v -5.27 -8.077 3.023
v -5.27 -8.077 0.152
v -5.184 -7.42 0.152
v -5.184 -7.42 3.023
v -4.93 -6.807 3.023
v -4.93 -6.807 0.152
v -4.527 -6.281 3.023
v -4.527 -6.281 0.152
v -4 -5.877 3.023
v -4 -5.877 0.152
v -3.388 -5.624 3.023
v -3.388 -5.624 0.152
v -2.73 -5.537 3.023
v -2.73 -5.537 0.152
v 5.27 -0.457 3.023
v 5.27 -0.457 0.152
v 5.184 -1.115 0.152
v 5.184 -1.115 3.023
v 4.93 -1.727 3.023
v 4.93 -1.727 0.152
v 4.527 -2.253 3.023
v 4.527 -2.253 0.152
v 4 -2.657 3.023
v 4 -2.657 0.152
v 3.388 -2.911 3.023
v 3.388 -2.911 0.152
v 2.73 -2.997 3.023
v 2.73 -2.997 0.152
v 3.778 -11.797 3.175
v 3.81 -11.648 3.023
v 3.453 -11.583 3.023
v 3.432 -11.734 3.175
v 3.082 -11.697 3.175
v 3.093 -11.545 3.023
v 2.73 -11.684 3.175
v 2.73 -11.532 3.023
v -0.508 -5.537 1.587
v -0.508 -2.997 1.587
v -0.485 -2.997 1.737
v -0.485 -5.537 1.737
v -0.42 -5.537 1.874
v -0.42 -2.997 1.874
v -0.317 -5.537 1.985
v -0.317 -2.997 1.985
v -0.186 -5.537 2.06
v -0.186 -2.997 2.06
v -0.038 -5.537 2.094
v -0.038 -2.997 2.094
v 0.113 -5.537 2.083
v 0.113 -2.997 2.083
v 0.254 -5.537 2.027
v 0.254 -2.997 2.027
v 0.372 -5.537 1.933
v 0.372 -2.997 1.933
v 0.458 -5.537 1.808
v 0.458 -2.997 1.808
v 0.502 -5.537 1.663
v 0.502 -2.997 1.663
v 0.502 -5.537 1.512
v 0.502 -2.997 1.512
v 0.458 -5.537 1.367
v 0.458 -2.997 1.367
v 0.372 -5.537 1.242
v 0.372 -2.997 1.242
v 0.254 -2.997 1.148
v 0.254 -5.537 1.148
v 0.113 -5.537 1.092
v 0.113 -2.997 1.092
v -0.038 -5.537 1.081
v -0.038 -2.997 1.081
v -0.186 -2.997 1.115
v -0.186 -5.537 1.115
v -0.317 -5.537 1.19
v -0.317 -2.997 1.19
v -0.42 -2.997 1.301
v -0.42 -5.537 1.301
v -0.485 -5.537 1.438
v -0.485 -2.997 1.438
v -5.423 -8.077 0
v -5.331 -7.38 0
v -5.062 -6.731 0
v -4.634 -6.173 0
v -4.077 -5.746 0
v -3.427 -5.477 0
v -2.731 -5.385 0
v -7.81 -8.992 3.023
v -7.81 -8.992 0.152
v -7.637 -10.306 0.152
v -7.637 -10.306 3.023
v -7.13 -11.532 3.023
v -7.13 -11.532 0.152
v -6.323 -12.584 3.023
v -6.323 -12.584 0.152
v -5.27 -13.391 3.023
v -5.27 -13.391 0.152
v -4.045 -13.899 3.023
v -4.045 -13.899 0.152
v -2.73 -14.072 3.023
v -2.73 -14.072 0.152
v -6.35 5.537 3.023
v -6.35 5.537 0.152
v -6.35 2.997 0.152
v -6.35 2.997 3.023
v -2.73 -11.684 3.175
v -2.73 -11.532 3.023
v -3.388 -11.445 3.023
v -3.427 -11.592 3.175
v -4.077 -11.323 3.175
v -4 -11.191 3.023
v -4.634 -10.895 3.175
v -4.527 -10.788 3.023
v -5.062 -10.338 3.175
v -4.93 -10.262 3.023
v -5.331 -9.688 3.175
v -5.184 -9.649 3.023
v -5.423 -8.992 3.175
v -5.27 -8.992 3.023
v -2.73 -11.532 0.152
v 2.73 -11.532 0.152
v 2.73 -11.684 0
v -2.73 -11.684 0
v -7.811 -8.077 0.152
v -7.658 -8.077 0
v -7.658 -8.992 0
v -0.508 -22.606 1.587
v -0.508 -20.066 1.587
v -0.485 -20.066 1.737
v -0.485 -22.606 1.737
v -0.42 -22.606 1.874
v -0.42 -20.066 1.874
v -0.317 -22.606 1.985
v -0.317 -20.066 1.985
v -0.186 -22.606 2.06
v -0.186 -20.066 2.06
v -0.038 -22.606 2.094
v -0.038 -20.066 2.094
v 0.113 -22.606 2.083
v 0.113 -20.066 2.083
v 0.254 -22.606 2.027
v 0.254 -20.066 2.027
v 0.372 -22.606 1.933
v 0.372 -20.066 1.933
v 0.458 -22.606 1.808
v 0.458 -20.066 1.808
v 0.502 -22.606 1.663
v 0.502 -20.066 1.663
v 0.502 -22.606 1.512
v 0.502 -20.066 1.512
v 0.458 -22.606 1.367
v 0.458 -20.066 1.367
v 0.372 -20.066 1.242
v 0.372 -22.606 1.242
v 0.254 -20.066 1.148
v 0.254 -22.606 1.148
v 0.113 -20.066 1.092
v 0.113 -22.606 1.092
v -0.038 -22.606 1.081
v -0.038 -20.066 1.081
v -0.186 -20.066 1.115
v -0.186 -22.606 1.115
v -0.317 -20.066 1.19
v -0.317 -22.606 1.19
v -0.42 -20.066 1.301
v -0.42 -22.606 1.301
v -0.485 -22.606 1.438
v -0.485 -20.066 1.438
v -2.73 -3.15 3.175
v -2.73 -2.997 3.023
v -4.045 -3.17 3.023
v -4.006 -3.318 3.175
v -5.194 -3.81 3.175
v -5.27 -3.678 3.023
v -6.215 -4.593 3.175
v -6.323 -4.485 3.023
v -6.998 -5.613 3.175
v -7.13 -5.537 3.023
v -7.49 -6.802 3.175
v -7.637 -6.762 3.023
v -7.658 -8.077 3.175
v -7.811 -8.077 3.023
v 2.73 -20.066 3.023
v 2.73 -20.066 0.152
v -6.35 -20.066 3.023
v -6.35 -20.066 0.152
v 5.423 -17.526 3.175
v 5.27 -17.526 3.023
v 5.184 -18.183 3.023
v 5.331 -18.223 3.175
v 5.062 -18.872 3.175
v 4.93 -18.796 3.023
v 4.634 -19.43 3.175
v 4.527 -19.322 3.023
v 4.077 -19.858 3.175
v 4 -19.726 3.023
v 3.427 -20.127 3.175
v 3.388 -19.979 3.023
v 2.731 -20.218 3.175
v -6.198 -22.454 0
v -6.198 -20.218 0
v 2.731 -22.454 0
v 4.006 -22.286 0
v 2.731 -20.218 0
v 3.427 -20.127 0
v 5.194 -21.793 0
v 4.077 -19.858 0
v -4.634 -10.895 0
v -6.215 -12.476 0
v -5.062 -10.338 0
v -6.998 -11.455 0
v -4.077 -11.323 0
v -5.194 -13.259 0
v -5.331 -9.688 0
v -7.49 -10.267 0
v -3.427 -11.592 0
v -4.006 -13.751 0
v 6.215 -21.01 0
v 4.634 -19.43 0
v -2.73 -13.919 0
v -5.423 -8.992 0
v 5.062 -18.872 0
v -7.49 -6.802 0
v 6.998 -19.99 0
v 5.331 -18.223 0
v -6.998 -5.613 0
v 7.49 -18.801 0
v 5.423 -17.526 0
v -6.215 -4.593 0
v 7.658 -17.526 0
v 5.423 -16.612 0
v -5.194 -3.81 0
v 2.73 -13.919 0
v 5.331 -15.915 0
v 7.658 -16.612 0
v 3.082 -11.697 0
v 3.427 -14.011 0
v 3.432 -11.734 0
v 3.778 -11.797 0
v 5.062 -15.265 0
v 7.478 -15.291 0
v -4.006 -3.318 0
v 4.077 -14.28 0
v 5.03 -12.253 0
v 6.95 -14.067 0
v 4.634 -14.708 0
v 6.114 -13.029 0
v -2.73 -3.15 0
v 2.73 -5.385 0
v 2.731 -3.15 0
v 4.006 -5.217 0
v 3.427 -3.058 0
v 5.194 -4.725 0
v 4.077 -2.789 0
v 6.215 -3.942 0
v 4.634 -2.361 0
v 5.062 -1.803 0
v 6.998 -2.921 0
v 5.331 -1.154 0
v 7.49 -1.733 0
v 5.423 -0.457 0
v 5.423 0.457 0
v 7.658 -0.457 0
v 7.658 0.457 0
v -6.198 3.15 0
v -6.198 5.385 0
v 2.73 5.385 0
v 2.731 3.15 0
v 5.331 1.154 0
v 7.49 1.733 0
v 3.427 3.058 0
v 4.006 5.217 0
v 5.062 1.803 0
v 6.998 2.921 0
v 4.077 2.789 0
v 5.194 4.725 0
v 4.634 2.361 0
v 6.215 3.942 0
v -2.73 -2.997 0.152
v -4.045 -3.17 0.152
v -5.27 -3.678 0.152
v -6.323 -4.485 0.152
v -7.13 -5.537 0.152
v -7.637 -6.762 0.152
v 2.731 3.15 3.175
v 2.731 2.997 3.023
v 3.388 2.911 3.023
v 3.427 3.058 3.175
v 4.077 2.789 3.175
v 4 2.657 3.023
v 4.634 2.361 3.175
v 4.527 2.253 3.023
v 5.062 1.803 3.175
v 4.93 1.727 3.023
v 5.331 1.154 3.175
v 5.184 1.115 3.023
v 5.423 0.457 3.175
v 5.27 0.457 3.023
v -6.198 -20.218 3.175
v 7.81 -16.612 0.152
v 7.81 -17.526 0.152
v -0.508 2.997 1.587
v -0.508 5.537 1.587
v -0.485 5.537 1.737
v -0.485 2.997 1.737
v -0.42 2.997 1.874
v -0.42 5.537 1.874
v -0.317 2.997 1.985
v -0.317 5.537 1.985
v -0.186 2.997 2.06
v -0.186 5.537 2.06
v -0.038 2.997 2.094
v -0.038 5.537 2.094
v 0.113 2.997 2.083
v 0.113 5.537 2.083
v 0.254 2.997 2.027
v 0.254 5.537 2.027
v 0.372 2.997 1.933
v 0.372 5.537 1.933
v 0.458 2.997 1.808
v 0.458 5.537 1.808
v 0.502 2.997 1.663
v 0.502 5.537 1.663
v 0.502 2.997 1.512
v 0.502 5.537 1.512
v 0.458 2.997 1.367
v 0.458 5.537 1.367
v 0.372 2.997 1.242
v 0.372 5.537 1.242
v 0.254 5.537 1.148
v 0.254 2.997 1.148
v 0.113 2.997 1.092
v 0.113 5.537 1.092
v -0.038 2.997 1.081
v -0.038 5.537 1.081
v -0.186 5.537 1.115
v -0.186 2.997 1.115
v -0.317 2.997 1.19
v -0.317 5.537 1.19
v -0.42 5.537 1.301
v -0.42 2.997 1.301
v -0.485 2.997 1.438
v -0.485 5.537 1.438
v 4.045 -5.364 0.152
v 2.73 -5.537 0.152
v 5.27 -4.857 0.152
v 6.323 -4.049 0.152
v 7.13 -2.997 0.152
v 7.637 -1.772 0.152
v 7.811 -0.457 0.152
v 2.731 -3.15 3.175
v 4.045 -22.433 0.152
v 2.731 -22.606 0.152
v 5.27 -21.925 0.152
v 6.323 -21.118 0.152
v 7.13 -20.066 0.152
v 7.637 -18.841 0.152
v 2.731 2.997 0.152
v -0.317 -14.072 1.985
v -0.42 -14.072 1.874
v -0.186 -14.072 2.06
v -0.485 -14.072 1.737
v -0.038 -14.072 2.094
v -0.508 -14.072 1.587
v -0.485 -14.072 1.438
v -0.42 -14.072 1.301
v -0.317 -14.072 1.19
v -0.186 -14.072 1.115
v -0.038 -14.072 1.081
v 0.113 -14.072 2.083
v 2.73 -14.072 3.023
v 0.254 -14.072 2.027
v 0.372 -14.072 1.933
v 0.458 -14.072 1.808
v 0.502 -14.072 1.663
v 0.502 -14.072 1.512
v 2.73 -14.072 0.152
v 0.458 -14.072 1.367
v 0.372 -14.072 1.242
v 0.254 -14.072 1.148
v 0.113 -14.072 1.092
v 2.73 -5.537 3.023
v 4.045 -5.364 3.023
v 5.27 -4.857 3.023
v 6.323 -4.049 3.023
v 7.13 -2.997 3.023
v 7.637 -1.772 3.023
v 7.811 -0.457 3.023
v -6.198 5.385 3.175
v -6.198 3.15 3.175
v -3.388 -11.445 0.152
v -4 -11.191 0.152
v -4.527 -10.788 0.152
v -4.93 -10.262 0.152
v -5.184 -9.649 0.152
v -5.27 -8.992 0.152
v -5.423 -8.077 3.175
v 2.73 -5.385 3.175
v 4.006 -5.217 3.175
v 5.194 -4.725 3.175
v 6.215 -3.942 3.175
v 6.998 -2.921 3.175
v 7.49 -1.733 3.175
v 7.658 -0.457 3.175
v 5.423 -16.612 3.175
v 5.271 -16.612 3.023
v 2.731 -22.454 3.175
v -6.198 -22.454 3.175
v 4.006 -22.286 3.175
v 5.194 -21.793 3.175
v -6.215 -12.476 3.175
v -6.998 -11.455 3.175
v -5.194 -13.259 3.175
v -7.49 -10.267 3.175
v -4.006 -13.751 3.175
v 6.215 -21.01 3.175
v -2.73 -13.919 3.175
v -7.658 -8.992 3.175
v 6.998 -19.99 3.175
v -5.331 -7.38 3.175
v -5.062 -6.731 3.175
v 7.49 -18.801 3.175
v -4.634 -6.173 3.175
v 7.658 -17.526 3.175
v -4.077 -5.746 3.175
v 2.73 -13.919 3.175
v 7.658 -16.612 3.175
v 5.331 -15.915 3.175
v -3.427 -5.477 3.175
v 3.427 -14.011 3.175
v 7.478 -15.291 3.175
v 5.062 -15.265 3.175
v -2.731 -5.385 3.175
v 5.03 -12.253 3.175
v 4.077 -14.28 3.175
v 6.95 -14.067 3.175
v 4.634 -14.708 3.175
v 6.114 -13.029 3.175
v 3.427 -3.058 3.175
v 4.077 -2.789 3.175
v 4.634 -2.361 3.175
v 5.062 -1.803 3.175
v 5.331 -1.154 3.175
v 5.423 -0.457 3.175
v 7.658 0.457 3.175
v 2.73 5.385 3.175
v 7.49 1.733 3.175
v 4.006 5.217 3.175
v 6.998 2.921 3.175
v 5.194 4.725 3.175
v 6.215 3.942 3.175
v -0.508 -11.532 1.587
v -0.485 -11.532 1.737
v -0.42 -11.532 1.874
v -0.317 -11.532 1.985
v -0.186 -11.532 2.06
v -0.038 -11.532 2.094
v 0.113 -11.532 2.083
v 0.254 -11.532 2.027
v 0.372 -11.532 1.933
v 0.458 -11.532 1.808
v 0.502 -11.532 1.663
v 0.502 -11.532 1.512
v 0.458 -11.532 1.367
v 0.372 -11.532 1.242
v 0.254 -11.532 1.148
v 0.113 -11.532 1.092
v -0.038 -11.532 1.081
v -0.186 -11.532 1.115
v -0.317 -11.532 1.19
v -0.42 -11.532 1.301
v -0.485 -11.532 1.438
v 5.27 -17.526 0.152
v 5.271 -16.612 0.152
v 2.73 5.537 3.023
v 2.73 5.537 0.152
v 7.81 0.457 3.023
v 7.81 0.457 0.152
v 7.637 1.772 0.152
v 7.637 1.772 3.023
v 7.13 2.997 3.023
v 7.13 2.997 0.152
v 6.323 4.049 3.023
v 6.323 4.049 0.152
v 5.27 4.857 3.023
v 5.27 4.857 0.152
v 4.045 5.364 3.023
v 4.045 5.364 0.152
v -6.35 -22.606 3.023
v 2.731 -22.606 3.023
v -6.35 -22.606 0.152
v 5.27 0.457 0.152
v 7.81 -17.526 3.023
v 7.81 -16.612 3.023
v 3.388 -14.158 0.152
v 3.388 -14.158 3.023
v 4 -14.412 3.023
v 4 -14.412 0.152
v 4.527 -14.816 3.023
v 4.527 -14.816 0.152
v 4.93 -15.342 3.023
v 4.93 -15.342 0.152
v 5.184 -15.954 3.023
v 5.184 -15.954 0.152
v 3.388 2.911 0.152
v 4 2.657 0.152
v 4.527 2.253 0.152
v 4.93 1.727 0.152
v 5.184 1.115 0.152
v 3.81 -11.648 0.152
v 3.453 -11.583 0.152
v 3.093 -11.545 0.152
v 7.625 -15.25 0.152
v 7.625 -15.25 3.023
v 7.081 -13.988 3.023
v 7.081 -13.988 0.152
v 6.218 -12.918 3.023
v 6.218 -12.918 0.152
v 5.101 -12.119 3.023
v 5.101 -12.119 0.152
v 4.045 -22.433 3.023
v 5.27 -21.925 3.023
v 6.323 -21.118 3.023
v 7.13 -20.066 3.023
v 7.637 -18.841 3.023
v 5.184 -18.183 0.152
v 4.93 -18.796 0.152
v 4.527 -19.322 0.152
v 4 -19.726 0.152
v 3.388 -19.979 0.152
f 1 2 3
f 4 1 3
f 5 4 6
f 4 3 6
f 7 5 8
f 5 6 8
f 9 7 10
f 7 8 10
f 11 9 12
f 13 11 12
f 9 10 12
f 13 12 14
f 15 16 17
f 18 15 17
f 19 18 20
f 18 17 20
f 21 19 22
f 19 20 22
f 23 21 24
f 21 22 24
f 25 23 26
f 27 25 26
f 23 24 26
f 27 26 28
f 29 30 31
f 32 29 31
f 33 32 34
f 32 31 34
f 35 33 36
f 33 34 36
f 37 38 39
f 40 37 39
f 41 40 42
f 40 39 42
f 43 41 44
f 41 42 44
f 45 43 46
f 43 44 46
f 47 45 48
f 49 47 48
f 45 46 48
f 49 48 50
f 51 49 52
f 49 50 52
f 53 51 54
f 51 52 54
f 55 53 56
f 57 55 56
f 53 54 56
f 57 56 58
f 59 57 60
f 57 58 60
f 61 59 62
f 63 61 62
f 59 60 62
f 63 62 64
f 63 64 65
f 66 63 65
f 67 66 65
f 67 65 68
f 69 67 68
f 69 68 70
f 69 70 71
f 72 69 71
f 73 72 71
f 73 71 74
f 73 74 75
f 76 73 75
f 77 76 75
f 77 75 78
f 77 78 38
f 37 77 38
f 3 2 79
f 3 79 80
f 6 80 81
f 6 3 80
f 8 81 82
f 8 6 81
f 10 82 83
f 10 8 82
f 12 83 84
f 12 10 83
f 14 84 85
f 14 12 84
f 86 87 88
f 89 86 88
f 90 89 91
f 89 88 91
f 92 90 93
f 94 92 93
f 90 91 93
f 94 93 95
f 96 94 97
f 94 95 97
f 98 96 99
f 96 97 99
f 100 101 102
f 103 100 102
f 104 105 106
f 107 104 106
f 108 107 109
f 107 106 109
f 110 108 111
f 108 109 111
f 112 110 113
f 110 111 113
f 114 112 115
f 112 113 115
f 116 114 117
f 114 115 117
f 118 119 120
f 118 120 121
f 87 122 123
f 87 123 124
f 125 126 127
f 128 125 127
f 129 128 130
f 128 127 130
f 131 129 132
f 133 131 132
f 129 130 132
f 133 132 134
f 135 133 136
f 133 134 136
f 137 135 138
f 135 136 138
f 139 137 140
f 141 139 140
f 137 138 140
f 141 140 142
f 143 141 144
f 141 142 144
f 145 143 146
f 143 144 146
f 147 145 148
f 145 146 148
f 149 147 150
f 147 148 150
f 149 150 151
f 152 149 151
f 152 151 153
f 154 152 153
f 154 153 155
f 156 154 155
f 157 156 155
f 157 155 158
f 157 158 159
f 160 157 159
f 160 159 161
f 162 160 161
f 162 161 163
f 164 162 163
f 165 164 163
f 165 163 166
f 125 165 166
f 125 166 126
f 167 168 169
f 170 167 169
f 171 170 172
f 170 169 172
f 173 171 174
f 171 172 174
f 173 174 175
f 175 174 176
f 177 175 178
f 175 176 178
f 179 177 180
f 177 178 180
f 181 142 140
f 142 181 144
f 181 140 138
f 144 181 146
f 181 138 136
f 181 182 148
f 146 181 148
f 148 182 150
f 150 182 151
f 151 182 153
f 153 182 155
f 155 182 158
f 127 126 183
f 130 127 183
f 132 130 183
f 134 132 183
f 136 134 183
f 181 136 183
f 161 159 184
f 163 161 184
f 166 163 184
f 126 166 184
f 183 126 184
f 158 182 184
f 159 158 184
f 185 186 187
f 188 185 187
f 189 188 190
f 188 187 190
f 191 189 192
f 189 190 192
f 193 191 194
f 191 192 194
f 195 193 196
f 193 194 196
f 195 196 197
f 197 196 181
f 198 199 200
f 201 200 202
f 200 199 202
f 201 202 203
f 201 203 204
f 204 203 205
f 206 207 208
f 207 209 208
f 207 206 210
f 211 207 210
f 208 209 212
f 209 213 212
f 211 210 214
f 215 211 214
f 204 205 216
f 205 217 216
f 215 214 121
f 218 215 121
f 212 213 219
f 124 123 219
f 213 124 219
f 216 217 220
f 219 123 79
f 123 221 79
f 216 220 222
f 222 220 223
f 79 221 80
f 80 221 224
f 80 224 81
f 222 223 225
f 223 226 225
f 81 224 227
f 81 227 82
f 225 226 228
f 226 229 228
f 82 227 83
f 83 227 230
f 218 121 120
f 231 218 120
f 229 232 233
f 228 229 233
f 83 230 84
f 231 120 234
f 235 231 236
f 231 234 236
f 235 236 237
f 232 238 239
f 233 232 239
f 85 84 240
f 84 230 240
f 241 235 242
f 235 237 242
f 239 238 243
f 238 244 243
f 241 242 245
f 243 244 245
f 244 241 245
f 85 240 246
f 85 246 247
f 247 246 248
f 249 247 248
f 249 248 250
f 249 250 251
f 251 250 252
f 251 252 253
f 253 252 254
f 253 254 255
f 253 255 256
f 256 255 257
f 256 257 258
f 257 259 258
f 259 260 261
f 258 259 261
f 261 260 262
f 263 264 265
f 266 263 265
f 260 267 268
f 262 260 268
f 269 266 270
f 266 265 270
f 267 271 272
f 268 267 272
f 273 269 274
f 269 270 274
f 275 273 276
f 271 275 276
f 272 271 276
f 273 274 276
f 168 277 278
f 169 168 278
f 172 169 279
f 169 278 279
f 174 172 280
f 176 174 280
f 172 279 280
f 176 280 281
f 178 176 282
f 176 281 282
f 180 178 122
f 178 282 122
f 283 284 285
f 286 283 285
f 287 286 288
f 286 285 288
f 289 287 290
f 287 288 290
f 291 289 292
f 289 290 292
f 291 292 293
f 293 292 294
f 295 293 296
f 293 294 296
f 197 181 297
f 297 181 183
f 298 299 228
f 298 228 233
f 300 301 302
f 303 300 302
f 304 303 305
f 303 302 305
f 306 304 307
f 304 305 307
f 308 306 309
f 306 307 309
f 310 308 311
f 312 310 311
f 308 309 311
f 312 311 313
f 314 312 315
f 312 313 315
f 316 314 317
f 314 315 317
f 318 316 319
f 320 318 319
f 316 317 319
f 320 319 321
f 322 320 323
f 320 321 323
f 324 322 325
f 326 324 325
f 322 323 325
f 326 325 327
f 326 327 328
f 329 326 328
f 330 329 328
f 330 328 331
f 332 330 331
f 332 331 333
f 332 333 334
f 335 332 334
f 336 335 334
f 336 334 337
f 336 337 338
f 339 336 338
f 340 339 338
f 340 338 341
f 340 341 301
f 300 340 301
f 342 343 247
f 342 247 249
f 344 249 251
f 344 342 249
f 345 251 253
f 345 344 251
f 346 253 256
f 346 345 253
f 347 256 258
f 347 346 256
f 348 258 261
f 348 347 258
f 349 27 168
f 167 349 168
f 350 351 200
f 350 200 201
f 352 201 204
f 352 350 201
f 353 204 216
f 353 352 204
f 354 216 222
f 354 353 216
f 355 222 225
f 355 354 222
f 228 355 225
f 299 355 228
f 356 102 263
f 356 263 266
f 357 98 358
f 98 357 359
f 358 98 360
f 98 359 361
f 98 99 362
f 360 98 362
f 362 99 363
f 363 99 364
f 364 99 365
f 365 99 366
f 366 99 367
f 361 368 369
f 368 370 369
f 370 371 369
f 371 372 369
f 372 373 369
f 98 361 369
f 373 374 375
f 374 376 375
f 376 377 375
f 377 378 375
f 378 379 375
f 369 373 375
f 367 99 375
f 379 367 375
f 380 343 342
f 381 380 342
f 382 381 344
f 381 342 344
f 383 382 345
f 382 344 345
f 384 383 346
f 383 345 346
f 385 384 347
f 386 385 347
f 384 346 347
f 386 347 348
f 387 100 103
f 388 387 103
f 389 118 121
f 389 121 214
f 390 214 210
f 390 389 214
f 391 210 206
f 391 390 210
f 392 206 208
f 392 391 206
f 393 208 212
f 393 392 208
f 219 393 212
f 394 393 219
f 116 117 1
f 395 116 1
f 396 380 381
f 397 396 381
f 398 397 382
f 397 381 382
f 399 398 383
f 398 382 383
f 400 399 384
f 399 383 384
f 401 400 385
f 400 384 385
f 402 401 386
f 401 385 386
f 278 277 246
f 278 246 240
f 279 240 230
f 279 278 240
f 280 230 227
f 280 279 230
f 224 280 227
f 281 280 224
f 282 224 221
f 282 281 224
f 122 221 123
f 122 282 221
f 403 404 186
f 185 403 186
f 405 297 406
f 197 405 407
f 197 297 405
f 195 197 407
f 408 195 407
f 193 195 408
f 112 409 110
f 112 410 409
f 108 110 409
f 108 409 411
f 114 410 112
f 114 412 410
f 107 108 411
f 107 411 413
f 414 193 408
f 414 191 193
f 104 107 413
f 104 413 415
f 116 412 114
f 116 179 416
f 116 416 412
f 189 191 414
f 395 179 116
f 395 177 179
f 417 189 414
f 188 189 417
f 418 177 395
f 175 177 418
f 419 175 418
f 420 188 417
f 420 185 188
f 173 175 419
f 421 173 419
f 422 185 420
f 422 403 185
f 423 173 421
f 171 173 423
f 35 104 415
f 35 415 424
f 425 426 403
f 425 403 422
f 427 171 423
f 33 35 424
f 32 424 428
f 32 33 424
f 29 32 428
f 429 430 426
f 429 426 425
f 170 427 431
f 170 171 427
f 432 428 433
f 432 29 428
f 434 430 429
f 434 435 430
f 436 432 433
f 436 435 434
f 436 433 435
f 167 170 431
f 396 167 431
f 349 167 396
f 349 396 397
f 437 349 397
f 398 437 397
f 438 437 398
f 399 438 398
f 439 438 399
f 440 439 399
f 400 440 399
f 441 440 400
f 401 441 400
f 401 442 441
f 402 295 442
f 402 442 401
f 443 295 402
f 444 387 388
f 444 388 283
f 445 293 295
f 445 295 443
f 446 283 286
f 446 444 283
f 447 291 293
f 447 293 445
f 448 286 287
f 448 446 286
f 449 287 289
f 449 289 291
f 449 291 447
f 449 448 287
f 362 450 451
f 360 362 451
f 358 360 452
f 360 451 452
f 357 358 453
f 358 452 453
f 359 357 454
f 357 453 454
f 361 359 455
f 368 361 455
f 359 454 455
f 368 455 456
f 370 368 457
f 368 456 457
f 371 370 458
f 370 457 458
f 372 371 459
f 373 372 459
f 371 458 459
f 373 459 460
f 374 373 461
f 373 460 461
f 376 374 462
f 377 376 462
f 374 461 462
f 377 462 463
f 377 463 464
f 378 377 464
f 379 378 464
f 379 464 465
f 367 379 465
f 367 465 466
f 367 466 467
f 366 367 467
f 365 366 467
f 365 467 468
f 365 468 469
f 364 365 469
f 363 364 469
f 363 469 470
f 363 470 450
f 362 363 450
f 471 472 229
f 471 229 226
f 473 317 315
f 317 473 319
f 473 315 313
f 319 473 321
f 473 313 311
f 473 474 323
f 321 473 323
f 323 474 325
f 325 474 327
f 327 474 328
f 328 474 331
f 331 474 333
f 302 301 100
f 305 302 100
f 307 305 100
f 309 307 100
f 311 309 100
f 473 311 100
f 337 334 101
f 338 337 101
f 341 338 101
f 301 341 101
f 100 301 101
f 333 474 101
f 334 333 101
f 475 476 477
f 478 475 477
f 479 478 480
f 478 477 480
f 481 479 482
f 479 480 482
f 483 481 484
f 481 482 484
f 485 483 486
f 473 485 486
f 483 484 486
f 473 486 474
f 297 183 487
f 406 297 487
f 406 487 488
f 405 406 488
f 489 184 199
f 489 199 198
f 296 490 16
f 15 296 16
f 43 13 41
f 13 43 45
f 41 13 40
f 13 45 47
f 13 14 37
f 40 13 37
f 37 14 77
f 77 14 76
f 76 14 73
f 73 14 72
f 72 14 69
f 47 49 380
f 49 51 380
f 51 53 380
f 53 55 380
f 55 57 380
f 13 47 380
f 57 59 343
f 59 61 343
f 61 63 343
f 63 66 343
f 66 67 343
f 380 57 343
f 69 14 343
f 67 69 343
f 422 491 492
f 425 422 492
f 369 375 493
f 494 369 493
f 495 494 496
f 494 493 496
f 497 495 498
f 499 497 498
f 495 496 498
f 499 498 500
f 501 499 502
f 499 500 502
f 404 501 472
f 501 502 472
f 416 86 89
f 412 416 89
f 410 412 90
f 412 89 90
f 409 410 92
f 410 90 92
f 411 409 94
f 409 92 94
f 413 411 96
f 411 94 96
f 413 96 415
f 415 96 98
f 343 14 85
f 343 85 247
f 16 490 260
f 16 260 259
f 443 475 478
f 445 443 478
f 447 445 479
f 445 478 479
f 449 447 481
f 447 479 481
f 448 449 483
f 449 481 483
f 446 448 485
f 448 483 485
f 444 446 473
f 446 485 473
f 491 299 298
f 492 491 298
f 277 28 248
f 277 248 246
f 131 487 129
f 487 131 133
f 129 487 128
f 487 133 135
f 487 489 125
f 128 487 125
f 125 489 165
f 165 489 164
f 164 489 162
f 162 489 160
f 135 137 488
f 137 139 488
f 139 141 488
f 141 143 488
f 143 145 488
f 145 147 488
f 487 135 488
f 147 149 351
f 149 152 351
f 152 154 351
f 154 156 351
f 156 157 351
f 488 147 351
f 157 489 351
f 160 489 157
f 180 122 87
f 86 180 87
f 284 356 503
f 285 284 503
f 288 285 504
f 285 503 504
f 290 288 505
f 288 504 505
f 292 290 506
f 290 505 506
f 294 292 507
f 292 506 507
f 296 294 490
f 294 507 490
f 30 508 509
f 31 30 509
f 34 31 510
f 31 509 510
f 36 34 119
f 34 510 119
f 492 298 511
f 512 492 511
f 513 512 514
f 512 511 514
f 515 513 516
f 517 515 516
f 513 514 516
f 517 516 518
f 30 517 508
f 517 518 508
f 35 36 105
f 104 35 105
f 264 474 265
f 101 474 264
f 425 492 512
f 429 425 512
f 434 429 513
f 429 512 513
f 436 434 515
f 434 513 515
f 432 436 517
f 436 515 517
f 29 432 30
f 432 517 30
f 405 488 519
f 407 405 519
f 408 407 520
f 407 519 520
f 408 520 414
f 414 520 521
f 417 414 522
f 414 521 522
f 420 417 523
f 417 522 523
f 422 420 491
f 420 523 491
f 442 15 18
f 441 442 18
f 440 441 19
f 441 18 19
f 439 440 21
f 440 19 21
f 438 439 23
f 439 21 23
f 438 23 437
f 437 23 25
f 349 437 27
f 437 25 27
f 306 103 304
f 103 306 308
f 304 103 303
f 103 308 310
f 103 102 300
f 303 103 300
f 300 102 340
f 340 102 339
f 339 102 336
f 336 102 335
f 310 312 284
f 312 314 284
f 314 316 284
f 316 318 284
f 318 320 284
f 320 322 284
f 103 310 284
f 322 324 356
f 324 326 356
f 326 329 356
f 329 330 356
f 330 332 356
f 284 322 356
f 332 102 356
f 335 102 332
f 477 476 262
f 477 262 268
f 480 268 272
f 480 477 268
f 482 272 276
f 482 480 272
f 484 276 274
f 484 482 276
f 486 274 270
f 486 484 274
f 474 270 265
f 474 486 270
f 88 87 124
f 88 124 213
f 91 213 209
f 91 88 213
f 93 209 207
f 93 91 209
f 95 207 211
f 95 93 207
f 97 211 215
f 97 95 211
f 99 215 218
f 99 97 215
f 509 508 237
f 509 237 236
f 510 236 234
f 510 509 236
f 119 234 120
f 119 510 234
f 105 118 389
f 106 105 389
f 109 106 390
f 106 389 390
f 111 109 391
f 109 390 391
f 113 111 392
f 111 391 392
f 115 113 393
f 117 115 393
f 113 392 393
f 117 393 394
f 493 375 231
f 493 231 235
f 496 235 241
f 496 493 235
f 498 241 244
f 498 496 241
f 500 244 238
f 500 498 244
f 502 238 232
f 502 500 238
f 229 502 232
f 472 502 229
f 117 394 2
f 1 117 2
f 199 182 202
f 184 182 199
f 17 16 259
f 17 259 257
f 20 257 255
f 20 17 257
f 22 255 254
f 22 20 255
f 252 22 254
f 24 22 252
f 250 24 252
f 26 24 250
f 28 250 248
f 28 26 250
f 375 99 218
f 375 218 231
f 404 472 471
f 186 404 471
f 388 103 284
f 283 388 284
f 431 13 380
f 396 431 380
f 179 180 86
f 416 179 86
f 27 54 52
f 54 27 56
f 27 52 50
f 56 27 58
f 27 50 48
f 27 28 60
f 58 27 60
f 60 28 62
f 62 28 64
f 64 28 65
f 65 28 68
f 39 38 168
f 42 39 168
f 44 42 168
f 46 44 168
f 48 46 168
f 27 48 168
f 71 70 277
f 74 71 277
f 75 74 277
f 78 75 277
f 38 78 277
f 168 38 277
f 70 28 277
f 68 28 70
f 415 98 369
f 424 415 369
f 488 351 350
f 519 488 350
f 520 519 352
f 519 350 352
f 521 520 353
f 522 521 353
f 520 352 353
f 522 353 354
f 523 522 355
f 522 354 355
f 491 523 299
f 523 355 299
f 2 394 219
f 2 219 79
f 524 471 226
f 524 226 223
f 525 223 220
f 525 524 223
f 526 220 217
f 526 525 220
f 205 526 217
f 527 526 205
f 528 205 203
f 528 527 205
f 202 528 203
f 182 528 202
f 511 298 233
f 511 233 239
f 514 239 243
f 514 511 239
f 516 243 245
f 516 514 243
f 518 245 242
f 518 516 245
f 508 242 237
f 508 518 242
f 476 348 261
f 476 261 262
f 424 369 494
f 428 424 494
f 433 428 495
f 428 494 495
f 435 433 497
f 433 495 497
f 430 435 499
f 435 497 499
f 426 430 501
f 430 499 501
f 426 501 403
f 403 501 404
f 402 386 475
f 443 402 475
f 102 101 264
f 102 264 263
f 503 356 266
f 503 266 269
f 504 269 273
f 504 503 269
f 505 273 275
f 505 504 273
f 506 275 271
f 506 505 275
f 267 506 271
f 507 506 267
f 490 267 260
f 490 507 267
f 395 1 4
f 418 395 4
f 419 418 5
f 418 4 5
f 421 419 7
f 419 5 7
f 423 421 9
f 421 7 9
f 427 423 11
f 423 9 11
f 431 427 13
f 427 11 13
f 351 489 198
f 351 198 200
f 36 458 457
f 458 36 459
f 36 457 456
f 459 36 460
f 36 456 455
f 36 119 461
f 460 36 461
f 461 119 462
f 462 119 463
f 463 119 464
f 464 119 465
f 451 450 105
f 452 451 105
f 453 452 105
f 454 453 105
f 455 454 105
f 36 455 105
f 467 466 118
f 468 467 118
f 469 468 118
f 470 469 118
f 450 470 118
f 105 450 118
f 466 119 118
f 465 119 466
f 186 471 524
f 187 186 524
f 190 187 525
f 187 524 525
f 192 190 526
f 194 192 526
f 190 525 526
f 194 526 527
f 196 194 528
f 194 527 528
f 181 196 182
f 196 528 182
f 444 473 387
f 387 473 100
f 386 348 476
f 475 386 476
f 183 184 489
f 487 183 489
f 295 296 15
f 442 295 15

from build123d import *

# Parameters (mm, degrees)
F1_DEPTH = 3.175
F4_D     = 1.016
F5_SIZE  = 0.1524


with BuildPart() as f1:
    # F0 (on Top) → F1 (new body)
    with BuildSketch(Plane.XY):
        with BuildLine():
            ThreePointArc((5.2705, -0.4572), (4.526551, -2.253251), (2.7305, -2.9972))
            Line((2.7305, -2.9972), (1.0795, -2.9972))
            Line((1.0795, -2.9972), (-1.0795, -2.9972))
            Line((-1.0795, -2.9972), (-2.7305, -2.9972))
            ThreePointArc((-2.7305, -2.9972), (-6.322602, -4.485098), (-7.8105, -8.0772))
            Line((-7.8105, -8.0772), (-7.8105, -8.9916))
            ThreePointArc((-7.8105, -8.9916), (-6.322602, -12.583702), (-2.7305, -14.0716))
            Line((-2.7305, -14.0716), (-1.0795, -14.0716))
            Line((-1.0795, -14.0716), (1.0795, -14.0716))
            Line((1.0795, -14.0716), (2.7305, -14.0716))
            ThreePointArc((2.7305, -14.0716), (4.526551, -14.815549), (5.2705, -16.6116))
            Line((5.2705, -16.6116), (5.2705, -17.526))
            ThreePointArc((5.2705, -17.526), (4.526551, -19.322051), (2.7305, -20.066))
            Line((2.7305, -20.066), (1.0795, -20.066))
            Line((1.0795, -20.066), (-1.0795, -20.066))
            Line((-1.0795, -20.066), (-6.35, -20.066))
            Line((-6.35, -20.066), (-6.35, -22.606))
            Line((-6.35, -22.606), (2.7305, -22.606))
            ThreePointArc((2.7305, -22.606), (6.322602, -21.118102), (7.8105, -17.526))
            Line((7.8105, -17.526), (7.8105, -16.6116))
            ThreePointArc((7.8105, -16.6116), (6.685893, -13.423925), (3.81, -11.647622))
            ThreePointArc((3.81, -11.647622), (3.273358, -11.560689), (2.7305, -11.5316))
            Line((2.7305, -11.5316), (1.0795, -11.5316))
            Line((1.0795, -11.5316), (-1.0795, -11.5316))
            Line((-1.0795, -11.5316), (-2.7305, -11.5316))
            ThreePointArc((-2.7305, -11.5316), (-4.526551, -10.787651), (-5.2705, -8.9916))
            Line((-5.2705, -8.9916), (-5.2705, -8.0772))
            ThreePointArc((-5.2705, -8.0772), (-4.526551, -6.281149), (-2.7305, -5.5372))
            Line((-2.7305, -5.5372), (-1.0795, -5.5372))
            Line((-1.0795, -5.5372), (1.0795, -5.5372))
            Line((1.0795, -5.5372), (2.7305, -5.5372))
            ThreePointArc((2.7305, -5.5372), (6.322602, -4.049302), (7.8105, -0.4572))
            Line((7.8105, -0.4572), (7.8105, 0.4572))
            ThreePointArc((7.8105, 0.4572), (6.322602, 4.049302), (2.7305, 5.5372))
            Line((2.7305, 5.5372), (-6.35, 5.5372))
            Line((-6.35, 5.5372), (-6.35, 2.9972))
            Line((-6.35, 2.9972), (-1.0795, 2.9972))
            Line((-1.0795, 2.9972), (1.0795, 2.9972))
            Line((1.0795, 2.9972), (2.7305, 2.9972))
            ThreePointArc((2.7305, 2.9972), (4.526551, 2.253251), (5.2705, 0.4572))
            Line((5.2705, 0.4572), (5.2705, -0.4572))
        make_face()
    extrude(amount=F1_DEPTH)

    # F4 (through all)
    with Locations(Plane.XZ.offset(22.606)):
        with Locations((0, 1.5875)):
            Hole(F4_D / 2)

    # F5
    f5_edges = [f1.edges().sort_by_distance(p)[0] for p in [
        (4.526551, 2.253251, 3.175),
        (5.2705, 0, 3.175),
        (4.526551, -2.253251, 3.175),
        (0, -2.9972, 3.175),
        (-6.322602, -4.485098, 3.175),
        (-7.8105, -8.5344, 3.175),
        (-6.322602, -12.583702, 3.175),
        (0, -14.0716, 3.175),
        (4.526551, -14.815549, 3.175),
        (5.2705, -17.0688, 3.175),
        (4.526551, -19.322051, 3.175),
        (-1.80975, -20.066, 3.175),
        (-6.35, -21.336, 3.175),
        (-1.80975, -22.606, 3.175),
        (6.322602, -21.118102, 3.175),
        (7.8105, -17.0688, 3.175),
        (6.322602, -13.019498, 3.175),
        (0, -11.5316, 3.175),
        (-4.526551, -10.787651, 3.175),
        (-5.2705, -8.5344, 3.175),
        (-4.526551, -6.281149, 3.175),
        (0, -5.5372, 3.175),
        (6.322602, -4.049302, 3.175),
        (7.8105, 0, 3.175),
        (6.322602, 4.049302, 3.175),
        (-1.80975, 5.5372, 3.175),
        (-6.35, 4.2672, 3.175),
        (-1.80975, 2.9972, 3.175),
        (4.526551, 2.253251, 0),
        (5.2705, 0, 0),
        (4.526551, -2.253251, 0),
        (0, -2.9972, 0),
        (-6.322602, -4.485098, 0),
        (-7.8105, -8.5344, 0),
        (-6.322602, -12.583702, 0),
        (0, -14.0716, 0),
        (4.526551, -14.815549, 0),
        (5.2705, -17.0688, 0),
        (4.526551, -19.322051, 0),
        (-1.80975, -20.066, 0),
        (-6.35, -21.336, 0),
        (-1.80975, -22.606, 0),
        (6.322602, -21.118102, 0),
        (7.8105, -17.0688, 0),
        (6.322602, -13.019498, 0),
        (0, -11.5316, 0),
        (-4.526551, -10.787651, 0),
        (-5.2705, -8.5344, 0),
        (-4.526551, -6.281149, 0),
        (0, -5.5372, 0),
        (6.322602, -4.049302, 0),
        (7.8105, 0, 0),
        (6.322602, 4.049302, 0),
        (-1.80975, 5.5372, 0),
        (-6.35, 4.2672, 0),
        (-1.80975, 2.9972, 0),
    ]]
    chamfer(f5_edges, length=F5_SIZE)


solid = f1.part
